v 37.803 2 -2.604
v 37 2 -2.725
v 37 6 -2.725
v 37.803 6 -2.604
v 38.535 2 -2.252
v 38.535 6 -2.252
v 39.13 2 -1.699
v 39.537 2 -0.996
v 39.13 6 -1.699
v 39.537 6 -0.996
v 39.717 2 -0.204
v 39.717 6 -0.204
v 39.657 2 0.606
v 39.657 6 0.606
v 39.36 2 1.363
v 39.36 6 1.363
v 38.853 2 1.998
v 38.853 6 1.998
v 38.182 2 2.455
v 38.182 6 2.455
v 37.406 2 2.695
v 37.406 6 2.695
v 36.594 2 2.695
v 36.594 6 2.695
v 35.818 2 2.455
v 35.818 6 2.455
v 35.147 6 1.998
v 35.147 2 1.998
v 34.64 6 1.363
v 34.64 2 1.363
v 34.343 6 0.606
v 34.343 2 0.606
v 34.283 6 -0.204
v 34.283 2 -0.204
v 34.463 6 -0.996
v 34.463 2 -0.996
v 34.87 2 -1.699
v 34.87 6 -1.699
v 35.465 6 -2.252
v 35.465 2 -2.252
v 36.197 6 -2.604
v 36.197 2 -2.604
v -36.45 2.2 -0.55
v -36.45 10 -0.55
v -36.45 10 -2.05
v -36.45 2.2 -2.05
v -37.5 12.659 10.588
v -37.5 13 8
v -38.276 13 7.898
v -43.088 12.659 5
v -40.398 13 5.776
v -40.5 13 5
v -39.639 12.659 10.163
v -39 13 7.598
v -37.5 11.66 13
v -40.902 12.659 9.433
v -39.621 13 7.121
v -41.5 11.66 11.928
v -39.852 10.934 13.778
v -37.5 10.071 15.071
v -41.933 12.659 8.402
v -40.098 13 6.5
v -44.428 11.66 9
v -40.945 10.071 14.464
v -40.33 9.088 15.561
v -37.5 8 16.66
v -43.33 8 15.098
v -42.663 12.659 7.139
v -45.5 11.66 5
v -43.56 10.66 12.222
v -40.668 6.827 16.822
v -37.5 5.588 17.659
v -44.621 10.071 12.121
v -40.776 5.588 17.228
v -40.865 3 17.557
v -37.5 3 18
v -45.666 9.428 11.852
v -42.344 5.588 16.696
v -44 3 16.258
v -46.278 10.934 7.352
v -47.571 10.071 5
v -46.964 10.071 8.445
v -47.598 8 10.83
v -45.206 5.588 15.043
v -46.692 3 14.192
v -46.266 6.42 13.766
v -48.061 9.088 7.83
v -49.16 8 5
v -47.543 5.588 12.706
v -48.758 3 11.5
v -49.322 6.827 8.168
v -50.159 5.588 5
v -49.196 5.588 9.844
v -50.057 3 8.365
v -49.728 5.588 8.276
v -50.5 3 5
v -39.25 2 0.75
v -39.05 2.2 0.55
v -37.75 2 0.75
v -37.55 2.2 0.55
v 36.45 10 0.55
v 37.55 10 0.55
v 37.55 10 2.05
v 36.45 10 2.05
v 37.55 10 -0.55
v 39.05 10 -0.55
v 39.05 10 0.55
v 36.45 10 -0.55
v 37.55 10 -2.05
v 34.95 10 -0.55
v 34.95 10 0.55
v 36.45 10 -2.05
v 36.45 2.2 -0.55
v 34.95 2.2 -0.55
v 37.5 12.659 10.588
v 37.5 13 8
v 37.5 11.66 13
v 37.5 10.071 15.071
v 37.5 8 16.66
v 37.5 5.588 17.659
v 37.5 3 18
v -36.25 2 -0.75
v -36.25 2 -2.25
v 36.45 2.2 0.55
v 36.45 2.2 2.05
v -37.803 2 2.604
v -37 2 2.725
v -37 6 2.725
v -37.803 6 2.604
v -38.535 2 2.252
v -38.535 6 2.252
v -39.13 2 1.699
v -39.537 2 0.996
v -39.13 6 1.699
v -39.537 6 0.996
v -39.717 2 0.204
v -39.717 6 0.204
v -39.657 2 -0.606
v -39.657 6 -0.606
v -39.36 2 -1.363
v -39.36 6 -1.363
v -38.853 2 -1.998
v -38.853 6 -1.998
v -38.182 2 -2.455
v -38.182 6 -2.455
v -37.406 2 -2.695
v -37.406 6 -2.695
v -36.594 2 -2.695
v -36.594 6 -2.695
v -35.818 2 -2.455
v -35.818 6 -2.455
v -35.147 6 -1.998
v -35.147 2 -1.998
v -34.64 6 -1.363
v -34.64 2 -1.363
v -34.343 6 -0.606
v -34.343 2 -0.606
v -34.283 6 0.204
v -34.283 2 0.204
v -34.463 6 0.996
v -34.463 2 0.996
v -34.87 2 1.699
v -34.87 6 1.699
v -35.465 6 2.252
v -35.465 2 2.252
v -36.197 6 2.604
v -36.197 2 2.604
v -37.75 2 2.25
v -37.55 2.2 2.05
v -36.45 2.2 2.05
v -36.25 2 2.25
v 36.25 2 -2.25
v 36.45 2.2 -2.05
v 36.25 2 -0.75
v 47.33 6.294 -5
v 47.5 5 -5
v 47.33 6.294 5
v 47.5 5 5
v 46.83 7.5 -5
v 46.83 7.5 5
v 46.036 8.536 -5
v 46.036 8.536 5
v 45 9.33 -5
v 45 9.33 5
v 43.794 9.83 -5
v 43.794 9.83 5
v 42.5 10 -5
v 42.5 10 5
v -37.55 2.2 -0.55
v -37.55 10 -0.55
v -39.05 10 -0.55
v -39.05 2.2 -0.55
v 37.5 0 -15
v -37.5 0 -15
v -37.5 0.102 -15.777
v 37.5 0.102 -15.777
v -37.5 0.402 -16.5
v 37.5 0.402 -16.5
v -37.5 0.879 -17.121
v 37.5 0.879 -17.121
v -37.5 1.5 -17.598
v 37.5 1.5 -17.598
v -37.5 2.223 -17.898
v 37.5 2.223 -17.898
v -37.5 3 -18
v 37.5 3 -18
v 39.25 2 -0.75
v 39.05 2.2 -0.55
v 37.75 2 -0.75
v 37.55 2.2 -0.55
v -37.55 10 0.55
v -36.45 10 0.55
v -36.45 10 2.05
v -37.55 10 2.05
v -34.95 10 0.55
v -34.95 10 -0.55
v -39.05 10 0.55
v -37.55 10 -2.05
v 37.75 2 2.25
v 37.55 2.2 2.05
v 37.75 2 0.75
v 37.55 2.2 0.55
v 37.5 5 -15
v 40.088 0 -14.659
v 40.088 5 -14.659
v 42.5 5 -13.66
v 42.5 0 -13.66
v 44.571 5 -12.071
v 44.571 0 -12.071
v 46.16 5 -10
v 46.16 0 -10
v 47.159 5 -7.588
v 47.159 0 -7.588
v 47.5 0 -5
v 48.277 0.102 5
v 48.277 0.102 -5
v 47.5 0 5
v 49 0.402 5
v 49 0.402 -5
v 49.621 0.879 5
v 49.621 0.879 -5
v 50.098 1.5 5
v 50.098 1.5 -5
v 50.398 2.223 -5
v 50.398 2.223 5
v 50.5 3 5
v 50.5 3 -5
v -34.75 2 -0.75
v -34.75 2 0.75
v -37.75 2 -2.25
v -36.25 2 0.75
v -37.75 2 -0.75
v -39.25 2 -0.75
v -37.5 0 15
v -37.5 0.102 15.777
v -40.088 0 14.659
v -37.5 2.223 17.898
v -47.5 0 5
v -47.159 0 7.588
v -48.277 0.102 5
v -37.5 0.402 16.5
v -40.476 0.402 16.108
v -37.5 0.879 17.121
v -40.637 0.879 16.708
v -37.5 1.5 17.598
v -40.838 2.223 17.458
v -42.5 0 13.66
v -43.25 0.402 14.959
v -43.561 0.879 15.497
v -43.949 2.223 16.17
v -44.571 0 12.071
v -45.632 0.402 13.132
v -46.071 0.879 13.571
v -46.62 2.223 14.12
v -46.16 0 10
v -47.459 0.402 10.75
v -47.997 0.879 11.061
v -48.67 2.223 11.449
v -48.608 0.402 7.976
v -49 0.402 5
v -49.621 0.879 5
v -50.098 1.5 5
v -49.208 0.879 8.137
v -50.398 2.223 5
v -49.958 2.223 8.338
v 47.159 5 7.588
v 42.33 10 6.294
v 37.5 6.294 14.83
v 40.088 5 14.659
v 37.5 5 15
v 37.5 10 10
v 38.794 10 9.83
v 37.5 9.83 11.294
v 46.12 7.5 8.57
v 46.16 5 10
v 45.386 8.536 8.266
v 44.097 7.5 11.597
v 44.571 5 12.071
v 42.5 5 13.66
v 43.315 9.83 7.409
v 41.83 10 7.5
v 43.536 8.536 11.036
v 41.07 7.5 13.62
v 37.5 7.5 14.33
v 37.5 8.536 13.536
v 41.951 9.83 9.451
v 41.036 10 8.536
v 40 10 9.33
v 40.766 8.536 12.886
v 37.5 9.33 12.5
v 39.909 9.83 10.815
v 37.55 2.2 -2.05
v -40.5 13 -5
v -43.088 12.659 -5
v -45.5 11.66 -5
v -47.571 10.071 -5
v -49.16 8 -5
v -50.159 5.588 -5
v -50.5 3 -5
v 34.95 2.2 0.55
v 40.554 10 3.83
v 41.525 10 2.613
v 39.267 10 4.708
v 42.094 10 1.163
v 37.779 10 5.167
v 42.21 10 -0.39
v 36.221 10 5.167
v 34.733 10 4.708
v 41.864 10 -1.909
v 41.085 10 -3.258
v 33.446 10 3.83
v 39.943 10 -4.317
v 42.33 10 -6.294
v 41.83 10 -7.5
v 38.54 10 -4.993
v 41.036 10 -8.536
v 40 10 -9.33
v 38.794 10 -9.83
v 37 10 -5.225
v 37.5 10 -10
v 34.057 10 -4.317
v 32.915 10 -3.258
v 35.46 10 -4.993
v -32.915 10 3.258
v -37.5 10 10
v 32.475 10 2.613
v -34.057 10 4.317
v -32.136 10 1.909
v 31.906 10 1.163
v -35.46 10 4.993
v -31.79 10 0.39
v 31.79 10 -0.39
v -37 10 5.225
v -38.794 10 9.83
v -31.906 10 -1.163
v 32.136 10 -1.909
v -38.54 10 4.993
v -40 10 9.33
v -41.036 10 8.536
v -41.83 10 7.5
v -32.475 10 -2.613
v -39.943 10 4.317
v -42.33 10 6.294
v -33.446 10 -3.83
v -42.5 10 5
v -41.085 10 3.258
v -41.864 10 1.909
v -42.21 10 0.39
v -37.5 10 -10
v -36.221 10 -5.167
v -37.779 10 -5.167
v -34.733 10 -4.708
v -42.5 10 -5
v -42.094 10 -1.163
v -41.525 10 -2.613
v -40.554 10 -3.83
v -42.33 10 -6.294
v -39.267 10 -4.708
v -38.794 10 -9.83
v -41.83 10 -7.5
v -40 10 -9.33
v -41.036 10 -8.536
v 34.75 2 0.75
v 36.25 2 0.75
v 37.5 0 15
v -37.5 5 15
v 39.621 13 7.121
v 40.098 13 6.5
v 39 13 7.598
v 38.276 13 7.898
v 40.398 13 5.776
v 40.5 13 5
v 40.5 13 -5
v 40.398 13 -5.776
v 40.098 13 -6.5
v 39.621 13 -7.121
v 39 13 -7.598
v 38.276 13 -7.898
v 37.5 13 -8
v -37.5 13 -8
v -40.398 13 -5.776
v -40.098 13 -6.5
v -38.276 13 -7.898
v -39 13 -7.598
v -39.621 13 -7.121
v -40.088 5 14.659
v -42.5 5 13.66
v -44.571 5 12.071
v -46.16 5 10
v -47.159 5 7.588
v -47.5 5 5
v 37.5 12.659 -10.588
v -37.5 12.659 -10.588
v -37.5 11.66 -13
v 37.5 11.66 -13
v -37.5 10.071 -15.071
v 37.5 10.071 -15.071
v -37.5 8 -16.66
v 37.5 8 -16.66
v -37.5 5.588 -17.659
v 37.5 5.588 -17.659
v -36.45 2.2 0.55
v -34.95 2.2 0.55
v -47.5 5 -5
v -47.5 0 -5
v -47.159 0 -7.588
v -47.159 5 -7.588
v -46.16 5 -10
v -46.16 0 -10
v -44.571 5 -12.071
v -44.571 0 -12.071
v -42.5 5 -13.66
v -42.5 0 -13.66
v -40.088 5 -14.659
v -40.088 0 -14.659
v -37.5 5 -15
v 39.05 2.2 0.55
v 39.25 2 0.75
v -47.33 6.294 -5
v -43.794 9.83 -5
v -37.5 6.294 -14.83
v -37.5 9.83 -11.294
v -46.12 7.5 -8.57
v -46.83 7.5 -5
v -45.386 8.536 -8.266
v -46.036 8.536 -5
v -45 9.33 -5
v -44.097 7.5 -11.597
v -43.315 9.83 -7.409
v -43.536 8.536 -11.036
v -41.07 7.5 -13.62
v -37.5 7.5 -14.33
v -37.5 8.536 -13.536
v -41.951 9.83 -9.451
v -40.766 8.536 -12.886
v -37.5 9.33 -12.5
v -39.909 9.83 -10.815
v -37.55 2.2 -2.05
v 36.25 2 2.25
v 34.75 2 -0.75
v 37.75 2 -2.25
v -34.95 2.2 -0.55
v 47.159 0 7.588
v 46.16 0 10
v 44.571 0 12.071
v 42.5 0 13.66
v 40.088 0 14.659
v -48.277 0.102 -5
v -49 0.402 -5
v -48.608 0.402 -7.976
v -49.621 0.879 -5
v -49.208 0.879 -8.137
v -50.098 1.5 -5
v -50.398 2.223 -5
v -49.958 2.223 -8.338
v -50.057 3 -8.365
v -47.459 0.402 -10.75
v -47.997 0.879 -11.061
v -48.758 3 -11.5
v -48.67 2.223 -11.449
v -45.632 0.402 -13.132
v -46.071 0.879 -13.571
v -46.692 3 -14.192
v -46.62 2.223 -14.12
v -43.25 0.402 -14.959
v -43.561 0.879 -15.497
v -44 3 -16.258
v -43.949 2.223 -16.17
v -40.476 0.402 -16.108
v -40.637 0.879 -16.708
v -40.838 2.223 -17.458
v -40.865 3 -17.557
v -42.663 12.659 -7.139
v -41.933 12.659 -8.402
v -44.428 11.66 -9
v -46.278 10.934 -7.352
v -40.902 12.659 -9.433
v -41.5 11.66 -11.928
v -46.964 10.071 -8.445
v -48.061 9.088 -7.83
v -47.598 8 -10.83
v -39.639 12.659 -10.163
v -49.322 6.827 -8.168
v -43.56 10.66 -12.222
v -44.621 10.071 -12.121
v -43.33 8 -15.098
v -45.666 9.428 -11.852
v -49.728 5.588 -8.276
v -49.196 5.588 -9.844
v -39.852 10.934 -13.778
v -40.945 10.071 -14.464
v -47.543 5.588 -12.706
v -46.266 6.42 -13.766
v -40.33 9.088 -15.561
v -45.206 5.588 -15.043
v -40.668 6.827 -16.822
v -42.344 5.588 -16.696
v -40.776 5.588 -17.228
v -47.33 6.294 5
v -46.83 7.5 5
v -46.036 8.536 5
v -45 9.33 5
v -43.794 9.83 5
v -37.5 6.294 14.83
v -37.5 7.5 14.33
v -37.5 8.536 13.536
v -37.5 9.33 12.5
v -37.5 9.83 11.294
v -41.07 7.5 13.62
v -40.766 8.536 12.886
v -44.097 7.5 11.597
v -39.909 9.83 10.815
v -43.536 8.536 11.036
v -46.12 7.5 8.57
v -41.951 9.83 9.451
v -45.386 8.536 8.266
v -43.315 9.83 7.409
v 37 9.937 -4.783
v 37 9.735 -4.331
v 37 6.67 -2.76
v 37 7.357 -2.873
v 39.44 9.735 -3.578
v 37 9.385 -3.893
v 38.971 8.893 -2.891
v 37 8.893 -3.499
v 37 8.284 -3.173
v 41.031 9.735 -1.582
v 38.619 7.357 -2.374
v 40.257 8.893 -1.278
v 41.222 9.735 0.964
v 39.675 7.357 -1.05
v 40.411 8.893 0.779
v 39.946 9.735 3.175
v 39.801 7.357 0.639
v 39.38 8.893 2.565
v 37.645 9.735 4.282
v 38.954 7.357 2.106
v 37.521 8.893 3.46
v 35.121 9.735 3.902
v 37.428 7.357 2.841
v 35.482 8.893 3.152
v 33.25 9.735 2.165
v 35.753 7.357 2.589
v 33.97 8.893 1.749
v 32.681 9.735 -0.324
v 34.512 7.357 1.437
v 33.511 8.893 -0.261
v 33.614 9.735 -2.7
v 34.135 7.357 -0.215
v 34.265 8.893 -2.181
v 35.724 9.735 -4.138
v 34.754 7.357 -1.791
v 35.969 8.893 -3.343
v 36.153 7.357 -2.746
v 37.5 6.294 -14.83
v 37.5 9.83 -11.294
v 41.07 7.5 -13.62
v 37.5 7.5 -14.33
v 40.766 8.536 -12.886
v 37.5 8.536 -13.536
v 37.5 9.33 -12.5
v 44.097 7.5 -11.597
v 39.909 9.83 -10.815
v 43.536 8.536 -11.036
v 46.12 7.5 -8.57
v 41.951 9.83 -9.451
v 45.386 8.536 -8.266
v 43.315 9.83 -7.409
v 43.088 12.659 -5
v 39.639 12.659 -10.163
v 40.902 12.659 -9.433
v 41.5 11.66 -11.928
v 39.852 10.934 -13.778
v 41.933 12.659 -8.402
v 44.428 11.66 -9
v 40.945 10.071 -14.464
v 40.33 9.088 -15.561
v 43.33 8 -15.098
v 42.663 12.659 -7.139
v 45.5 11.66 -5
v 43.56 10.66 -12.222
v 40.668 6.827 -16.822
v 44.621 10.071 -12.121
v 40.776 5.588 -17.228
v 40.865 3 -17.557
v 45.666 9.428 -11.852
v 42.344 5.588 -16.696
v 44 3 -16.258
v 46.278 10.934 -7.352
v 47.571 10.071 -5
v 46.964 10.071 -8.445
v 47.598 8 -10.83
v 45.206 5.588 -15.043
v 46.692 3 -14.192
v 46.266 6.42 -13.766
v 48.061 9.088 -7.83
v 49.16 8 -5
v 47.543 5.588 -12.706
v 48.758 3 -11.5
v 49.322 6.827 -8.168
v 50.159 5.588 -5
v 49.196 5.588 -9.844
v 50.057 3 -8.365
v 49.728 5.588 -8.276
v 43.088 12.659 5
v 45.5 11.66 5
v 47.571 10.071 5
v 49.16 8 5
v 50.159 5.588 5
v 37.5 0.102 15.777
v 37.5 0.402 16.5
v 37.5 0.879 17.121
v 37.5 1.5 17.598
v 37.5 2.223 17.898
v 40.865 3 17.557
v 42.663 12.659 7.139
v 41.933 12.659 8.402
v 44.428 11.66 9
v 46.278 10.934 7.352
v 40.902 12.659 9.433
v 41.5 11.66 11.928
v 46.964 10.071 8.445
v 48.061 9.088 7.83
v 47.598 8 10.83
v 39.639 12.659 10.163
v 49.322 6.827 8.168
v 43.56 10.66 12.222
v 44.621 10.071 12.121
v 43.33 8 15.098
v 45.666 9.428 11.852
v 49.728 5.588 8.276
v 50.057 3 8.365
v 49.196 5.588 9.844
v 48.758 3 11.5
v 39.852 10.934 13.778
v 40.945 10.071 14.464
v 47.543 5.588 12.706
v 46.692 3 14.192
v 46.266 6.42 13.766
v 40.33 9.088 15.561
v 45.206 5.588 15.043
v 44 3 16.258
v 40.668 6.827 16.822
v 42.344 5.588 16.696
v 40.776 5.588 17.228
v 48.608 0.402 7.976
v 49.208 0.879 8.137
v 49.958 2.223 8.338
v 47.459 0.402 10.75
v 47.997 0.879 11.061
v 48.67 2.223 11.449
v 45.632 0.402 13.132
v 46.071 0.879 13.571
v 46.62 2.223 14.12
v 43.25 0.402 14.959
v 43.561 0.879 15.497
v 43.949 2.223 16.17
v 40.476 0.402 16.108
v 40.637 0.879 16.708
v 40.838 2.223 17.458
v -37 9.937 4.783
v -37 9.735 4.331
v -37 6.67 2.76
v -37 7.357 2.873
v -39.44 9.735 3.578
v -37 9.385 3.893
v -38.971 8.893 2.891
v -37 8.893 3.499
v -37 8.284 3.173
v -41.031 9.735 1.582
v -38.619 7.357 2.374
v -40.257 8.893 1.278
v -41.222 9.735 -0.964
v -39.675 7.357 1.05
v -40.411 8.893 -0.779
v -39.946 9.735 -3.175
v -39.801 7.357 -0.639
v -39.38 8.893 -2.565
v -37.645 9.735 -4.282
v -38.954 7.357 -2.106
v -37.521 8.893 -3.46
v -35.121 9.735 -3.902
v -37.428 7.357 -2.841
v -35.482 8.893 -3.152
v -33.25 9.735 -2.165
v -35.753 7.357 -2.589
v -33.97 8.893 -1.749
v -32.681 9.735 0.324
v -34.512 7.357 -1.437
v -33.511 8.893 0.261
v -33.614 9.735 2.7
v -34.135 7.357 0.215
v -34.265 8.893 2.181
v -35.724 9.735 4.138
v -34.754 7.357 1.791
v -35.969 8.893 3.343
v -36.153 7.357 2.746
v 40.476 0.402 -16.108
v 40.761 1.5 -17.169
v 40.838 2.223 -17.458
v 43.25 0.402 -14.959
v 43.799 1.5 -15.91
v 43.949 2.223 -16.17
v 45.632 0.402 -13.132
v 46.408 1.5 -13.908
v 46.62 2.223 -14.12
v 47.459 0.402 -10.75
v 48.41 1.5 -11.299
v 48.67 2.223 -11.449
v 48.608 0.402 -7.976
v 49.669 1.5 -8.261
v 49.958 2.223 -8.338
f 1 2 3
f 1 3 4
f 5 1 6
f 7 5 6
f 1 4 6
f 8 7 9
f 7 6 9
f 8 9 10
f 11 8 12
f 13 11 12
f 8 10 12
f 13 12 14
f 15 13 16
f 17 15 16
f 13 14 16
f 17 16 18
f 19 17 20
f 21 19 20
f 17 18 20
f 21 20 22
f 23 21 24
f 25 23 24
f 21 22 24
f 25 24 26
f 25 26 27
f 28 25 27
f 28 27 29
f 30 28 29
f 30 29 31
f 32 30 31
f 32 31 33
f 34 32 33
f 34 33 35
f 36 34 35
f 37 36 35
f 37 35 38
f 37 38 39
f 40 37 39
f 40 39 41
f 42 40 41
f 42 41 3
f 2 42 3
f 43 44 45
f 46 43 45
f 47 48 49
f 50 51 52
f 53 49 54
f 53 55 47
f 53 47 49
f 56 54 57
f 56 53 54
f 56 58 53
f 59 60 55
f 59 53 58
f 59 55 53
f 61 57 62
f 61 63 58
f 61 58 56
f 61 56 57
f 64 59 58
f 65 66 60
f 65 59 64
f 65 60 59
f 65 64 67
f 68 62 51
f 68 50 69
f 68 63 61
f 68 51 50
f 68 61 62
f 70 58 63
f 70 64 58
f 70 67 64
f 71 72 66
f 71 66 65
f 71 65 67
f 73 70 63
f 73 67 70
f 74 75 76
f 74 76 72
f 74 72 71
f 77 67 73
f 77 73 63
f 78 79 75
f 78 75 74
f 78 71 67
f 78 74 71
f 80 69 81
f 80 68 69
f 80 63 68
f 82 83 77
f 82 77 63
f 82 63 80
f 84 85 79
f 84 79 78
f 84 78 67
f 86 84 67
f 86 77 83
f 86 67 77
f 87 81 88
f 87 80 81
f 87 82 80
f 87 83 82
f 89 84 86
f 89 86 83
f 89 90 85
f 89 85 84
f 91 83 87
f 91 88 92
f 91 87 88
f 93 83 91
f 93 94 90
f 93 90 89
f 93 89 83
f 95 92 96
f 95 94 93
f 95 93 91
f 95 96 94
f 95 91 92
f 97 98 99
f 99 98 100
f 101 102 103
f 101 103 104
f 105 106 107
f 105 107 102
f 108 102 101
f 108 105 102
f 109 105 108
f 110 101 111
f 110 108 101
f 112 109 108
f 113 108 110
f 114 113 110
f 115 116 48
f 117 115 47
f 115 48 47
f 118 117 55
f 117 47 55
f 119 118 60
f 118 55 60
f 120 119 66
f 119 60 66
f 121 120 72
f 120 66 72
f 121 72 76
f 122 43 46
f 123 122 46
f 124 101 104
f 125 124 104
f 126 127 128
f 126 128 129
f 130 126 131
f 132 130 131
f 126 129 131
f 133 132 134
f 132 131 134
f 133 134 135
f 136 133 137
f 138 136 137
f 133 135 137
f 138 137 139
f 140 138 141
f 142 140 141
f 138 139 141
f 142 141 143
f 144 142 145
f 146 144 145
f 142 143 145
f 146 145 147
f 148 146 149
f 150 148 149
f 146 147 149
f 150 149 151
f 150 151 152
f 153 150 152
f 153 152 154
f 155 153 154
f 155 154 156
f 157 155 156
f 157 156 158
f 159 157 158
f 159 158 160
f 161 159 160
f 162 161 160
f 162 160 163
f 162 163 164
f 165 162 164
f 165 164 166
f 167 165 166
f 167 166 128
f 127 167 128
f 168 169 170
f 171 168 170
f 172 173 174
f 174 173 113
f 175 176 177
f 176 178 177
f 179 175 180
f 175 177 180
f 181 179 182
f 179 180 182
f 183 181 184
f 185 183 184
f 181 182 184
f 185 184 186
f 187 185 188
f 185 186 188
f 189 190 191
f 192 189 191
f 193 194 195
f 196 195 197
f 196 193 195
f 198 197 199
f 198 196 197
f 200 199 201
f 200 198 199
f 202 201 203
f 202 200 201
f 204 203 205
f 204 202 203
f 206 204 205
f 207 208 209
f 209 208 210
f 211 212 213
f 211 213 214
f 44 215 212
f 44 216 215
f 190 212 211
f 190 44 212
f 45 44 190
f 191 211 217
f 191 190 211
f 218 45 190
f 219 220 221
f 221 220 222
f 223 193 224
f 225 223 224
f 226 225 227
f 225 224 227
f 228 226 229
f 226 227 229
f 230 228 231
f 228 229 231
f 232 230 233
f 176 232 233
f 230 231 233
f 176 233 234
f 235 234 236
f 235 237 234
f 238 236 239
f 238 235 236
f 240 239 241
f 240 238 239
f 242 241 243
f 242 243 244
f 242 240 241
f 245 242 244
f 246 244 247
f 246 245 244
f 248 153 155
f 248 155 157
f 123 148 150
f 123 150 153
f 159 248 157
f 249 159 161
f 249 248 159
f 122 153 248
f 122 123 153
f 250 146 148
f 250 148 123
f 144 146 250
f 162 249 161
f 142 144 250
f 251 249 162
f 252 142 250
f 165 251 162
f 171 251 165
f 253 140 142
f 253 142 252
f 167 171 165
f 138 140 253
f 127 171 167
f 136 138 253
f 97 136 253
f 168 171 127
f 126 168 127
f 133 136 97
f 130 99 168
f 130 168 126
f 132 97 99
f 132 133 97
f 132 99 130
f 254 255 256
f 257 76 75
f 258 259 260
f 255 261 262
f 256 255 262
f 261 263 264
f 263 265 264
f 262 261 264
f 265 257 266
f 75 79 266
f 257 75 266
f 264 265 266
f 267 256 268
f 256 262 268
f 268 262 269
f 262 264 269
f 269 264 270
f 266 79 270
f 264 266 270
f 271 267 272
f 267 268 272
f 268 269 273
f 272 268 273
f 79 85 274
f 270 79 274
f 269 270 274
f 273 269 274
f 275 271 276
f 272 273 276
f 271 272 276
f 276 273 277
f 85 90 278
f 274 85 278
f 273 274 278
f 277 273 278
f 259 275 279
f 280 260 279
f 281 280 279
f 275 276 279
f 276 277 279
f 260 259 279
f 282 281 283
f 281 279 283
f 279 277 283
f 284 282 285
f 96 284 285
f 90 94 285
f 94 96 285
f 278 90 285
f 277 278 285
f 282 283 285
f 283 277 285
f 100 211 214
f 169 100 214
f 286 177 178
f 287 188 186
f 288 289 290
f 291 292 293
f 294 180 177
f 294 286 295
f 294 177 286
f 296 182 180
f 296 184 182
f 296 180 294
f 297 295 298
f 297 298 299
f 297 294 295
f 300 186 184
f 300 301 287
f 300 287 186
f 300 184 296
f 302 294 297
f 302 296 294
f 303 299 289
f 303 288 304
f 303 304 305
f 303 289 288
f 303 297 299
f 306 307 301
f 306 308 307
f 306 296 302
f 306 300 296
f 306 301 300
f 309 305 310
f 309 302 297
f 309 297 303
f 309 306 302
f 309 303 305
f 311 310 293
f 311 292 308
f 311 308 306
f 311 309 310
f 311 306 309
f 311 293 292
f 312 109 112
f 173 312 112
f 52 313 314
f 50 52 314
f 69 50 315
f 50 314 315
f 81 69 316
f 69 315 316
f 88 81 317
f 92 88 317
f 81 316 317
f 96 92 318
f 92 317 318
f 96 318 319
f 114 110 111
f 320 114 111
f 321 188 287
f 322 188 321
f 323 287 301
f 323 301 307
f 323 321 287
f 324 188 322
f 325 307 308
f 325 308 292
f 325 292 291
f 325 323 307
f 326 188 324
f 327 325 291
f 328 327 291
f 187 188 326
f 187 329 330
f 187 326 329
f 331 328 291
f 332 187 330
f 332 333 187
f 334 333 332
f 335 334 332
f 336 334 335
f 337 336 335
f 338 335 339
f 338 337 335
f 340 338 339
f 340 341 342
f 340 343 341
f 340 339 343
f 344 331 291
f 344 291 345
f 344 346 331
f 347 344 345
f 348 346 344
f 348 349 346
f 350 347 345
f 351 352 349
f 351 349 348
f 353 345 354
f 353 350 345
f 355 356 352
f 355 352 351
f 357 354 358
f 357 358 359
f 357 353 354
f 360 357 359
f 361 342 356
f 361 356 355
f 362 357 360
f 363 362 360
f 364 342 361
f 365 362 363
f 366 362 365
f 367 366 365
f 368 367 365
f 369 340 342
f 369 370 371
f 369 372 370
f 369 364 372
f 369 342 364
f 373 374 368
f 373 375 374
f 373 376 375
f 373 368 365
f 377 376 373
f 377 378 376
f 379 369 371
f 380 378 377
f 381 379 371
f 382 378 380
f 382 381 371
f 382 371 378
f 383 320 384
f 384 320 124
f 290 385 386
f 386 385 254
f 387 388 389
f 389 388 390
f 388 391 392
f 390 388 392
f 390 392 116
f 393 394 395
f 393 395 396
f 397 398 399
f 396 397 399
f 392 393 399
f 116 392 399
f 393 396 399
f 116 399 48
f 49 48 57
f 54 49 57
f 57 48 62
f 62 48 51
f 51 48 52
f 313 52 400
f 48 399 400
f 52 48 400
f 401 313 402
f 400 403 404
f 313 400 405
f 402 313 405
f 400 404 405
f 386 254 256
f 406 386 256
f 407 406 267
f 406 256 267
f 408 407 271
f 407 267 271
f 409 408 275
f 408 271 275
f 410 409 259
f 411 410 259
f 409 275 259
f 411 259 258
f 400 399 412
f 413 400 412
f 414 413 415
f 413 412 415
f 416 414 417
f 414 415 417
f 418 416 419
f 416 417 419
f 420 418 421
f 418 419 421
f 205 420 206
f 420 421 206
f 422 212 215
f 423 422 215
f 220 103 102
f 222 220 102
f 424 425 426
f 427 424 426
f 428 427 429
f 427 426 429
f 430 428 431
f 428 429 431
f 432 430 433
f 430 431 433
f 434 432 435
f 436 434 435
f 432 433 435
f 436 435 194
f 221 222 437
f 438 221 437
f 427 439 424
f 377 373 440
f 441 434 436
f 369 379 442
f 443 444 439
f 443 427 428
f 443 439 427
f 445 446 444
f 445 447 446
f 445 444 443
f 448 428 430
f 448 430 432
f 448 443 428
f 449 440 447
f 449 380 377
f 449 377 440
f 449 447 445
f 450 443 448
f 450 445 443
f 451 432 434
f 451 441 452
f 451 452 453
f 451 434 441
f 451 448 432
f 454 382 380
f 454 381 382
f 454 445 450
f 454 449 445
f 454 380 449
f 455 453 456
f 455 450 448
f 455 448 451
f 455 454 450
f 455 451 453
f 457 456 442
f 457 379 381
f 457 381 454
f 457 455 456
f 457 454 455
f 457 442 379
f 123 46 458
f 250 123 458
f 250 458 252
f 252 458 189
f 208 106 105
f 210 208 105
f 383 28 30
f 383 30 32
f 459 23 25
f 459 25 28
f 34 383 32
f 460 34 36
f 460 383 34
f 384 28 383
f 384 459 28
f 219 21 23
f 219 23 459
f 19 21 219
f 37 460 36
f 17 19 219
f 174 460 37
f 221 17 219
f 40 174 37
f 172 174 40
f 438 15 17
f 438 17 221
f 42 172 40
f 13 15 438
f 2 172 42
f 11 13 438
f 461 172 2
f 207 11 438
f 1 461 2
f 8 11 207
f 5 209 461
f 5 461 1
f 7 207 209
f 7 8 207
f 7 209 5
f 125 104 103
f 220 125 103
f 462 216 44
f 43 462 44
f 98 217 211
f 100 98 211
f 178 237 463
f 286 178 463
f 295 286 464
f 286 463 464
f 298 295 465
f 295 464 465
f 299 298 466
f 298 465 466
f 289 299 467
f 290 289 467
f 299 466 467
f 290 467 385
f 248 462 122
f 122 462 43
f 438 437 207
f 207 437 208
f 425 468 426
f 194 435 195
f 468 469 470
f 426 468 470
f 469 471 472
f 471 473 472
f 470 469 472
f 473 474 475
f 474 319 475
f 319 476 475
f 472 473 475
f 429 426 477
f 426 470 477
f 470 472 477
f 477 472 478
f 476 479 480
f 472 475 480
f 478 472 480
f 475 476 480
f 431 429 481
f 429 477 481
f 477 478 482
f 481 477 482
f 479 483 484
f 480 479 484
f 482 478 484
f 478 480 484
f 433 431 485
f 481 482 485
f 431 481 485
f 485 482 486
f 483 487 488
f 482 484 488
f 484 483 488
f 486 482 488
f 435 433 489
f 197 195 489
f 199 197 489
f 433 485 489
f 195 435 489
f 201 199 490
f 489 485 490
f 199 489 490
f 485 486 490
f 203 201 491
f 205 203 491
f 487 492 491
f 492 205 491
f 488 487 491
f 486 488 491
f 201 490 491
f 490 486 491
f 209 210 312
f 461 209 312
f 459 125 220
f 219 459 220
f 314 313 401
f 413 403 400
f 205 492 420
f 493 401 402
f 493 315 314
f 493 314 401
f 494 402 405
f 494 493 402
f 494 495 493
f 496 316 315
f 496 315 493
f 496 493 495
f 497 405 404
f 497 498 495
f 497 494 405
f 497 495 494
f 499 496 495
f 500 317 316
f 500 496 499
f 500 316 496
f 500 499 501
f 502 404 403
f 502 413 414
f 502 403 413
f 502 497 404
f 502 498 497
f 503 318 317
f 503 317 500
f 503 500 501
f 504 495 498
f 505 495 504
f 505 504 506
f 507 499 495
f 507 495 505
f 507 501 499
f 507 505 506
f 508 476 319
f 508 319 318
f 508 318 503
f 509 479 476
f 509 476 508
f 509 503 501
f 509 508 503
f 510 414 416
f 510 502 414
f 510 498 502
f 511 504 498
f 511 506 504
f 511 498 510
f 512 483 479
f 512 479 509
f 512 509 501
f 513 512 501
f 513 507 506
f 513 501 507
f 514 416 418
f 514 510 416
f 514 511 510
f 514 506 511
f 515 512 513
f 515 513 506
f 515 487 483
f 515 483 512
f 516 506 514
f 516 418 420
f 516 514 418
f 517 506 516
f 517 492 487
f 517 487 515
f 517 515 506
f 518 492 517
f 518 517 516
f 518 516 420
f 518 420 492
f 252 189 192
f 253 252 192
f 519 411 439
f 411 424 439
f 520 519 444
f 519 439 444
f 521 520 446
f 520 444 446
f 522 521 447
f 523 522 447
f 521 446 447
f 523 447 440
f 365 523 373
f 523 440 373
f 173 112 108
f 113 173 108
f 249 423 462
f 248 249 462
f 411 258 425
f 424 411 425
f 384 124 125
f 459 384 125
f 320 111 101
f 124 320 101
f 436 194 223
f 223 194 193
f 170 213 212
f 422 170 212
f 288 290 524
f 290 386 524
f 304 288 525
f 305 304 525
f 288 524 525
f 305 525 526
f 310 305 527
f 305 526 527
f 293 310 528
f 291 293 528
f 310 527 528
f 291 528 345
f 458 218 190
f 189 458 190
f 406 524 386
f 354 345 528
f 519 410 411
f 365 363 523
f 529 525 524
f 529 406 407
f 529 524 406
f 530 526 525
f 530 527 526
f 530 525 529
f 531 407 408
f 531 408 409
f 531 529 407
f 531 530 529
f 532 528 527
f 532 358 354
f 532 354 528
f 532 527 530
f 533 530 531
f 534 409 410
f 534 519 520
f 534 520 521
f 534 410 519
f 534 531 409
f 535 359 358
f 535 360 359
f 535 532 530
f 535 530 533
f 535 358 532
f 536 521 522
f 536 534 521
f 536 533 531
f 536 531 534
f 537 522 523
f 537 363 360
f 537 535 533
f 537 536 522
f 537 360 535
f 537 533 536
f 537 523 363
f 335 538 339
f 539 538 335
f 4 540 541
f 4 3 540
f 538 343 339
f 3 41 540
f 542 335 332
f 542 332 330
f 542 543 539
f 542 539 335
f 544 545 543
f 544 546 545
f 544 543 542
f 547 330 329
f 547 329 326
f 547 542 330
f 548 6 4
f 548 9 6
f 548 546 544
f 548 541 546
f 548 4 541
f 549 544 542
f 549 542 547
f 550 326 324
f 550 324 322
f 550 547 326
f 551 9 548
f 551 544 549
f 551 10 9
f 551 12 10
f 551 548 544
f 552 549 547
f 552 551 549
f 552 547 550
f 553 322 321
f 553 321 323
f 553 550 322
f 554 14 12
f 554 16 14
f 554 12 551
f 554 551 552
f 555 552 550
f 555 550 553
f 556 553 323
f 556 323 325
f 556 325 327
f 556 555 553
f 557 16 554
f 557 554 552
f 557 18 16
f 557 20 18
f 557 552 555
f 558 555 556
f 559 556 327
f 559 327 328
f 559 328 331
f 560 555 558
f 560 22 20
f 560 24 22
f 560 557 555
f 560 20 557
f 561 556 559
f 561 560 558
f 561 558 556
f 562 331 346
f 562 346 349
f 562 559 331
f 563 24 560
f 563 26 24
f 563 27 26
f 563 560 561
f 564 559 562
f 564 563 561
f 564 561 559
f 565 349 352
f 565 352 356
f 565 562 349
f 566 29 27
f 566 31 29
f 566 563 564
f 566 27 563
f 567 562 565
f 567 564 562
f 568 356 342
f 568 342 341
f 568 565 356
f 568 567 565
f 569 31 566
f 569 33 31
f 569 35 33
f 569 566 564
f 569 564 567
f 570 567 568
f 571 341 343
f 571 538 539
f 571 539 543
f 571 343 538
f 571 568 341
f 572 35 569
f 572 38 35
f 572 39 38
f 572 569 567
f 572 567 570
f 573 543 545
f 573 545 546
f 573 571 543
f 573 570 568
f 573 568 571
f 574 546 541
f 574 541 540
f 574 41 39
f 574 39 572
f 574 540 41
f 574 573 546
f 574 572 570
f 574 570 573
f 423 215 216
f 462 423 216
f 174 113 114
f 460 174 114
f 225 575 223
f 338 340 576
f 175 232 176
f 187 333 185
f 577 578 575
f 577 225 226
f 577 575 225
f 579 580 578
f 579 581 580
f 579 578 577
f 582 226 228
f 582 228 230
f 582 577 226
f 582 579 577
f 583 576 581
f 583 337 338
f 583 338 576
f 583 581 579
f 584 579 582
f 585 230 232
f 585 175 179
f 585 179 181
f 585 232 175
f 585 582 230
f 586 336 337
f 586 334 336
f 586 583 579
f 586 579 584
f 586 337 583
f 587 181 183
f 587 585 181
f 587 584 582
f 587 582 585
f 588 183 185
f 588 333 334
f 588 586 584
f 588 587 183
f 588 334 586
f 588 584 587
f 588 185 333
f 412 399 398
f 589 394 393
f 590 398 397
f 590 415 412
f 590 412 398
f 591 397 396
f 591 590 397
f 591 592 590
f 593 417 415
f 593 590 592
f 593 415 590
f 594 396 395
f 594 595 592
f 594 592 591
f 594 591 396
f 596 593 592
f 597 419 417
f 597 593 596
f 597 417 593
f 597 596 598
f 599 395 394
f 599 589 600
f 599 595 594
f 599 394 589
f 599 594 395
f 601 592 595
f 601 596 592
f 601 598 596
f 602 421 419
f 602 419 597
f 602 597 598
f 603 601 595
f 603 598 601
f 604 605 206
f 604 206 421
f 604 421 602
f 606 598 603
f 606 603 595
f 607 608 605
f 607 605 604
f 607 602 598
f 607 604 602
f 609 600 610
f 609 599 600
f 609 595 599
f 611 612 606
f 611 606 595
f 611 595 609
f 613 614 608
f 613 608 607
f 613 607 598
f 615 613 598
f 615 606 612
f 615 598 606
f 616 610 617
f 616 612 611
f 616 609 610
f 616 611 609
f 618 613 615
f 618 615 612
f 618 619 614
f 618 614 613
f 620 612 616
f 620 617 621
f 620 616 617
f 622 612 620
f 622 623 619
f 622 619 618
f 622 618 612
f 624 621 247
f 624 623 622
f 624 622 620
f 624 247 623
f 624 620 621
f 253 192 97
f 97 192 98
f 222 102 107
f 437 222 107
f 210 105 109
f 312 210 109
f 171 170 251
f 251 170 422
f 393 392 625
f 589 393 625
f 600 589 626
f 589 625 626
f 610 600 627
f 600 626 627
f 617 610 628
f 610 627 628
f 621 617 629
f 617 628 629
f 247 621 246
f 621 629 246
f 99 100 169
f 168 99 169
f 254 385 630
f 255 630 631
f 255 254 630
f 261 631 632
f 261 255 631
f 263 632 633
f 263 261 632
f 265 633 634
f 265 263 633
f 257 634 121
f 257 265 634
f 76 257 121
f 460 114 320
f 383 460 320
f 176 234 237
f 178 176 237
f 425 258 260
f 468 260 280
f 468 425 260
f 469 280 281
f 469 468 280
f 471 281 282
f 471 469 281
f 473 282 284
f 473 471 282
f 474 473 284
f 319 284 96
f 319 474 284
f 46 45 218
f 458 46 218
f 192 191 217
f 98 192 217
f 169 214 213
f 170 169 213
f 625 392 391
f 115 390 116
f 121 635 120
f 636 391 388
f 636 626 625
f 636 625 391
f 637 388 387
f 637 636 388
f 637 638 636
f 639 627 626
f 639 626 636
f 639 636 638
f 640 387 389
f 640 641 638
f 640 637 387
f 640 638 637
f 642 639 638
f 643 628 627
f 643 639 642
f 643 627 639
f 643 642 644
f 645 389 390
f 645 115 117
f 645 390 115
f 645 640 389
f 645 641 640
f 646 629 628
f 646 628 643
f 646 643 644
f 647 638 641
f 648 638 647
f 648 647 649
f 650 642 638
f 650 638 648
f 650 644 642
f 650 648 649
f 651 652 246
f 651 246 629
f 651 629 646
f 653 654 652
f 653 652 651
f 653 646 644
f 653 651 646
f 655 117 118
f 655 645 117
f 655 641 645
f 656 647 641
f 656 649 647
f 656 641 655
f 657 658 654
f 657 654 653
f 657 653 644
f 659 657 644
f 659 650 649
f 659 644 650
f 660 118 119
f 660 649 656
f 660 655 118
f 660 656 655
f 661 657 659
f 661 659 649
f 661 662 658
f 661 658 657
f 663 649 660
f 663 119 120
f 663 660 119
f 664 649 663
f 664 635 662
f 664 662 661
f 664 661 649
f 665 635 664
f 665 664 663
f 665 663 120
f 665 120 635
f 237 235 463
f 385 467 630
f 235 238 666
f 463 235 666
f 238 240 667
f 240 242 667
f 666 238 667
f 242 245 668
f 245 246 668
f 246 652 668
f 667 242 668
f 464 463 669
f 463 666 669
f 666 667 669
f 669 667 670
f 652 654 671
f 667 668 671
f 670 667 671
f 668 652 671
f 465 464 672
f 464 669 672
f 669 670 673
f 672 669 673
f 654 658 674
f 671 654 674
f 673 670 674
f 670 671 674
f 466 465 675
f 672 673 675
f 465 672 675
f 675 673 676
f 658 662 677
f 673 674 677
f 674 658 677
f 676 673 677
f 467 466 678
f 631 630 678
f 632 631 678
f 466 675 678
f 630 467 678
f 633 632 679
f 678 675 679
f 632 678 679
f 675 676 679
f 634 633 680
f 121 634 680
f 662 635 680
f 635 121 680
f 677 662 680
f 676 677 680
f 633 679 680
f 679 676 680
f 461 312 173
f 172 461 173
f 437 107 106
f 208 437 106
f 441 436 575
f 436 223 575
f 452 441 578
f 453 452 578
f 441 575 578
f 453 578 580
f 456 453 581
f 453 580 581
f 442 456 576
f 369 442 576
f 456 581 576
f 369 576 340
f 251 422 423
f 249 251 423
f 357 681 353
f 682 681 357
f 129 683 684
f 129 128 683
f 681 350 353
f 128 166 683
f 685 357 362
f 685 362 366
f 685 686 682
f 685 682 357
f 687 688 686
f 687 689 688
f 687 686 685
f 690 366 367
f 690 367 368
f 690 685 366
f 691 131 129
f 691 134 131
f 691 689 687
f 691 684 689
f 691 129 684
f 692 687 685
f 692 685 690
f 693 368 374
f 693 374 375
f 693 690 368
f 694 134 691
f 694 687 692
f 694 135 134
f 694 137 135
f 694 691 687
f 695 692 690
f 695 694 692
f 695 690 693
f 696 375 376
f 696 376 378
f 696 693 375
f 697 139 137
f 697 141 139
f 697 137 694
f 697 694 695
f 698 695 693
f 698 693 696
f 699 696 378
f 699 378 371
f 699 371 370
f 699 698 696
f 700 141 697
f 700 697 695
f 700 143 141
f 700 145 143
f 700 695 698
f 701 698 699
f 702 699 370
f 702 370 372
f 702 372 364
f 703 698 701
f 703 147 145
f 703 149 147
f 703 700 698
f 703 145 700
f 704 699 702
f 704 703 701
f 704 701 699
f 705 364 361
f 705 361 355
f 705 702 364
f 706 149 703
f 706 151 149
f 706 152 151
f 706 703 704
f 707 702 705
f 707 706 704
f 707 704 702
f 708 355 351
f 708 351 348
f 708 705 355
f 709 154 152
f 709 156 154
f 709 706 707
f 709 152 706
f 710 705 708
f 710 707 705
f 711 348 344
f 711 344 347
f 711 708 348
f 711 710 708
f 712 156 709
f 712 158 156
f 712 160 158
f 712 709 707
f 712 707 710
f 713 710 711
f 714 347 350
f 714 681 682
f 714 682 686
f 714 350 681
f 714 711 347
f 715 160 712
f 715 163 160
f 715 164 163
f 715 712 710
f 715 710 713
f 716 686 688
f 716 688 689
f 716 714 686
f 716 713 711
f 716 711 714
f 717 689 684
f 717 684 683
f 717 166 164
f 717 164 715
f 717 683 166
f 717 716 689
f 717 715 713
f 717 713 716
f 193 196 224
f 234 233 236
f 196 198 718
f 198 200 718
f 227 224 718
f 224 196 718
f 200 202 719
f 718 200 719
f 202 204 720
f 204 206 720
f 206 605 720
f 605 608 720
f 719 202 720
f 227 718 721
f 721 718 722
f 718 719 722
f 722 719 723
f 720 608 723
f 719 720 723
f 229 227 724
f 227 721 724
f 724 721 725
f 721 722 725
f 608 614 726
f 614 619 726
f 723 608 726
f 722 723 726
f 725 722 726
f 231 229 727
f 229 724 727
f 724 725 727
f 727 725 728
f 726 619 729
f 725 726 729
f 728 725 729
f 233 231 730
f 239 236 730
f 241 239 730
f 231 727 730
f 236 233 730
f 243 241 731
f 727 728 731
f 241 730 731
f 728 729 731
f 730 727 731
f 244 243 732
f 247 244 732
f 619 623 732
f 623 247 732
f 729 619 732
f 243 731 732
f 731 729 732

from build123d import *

# Parameters (mm, degrees)
EXTRUDE_1_DEPTH  = 10
SHELL_2_T        = 3
FILLET_3_R       = 10
FILLET_4_R       = 3
SKETCH_2_R       = 2.725
EXTRUDE_2_DEPTH  = 8
FILLET_7_R       = 5
CHAMFER_1_SIZE   = 0.2
CHAMFER_2_SIZE   = 0.2
FILLET_9_SIZE    = 2.5
FILLET_9_SIZE_2  = 4
FILLET_10_SIZE   = 2.5
FILLET_10_SIZE_2 = 4


# Some blends are built 0.0001 mm under size
with BuildPart() as part:
    # 草图1 → 凸台-拉伸1 (new body)
    with BuildSketch(Plane(origin=(0, 0, 0), x_dir=(1, 0, 0), z_dir=(0, 1, 0))):
        with BuildLine():
            Line((-37.5, 15), (37.5, 15))
            ThreePointArc((37.5, 15), (44.571067812, 12.071067812), (47.5, 5))
            Line((47.5, 5), (47.5, -5))
            ThreePointArc((47.5, -5), (44.571067812, -12.071067812), (37.5, -15))
            Line((37.5, -15), (-37.5, -15))
            ThreePointArc((-37.5, -15), (-44.571067812, -12.071067812), (-47.5, -5))
            Line((-47.5, -5), (-47.5, 5))
            ThreePointArc((-47.5, 5), (-44.571067812, 12.071067812), (-37.5, 15))
        make_face()
    extrude(amount=EXTRUDE_1_DEPTH)

    # 抽壳2
    shell_2_openings = [part.faces().sort_by_distance(p)[0] for p in [
        (0, 0, 0),
    ]]
    offset(amount=SHELL_2_T, openings=shell_2_openings, kind=Kind.INTERSECTION)

    # 圆角3
    # the kernel refuses this fillet: 10 mm, written as the material it takes off along each edge
    with BuildSketch(Plane(origin=(37.5, 13, 5), x_dir=(1, 0, 0), z_dir=(0, 0, -1))) as fillet_3_piece_1:
        with BuildLine():
            CenterArc((13 - FILLET_3_R, FILLET_3_R), FILLET_3_R, 270, 90)
            Line((13 - FILLET_3_R, 0), (13, 0))
            Line((13, 0), (13, FILLET_3_R))
        make_face()
    revolve(axis=Axis((37.5, 13, 5), (0, -1, 0)), revolution_arc=90, mode=Mode.SUBTRACT)
    with BuildSketch(Plane(origin=(50.5, 13, 5), x_dir=(0, -1, 0), z_dir=(0, 0, -1)), Plane(origin=(-50.5, 13, -5), x_dir=(0, -1, 0), z_dir=(0, 0, 1))) as fillet_3_piece_2:
        with BuildLine():
            CenterArc((FILLET_3_R, FILLET_3_R), FILLET_3_R, 180, 90)
            Line((0, FILLET_3_R), (0, 0))
            Line((0, 0), (FILLET_3_R, 0))
        make_face()
    extrude(amount=10, mode=Mode.SUBTRACT)
    with BuildSketch(Plane(origin=(37.5, 13, -5), x_dir=(0, 0, -1), z_dir=(-1, 0, 0))) as fillet_3_piece_3:
        with BuildLine():
            CenterArc((13 - FILLET_3_R, FILLET_3_R), FILLET_3_R, 270, 90)
            Line((13 - FILLET_3_R, 0), (13, 0))
            Line((13, 0), (13, FILLET_3_R))
        make_face()
    revolve(axis=Axis((37.5, 13, -5), (0, -1, 0)), revolution_arc=90, mode=Mode.SUBTRACT)
    with BuildSketch(Plane(origin=(37.5, 13, -18), x_dir=(0, -1, 0), z_dir=(-1, 0, 0)), Plane(origin=(-37.5, 13, 18), x_dir=(0, -1, 0), z_dir=(1, 0, 0))) as fillet_3_piece_4:
        with BuildLine():
            CenterArc((FILLET_3_R, FILLET_3_R), FILLET_3_R, 180, 90)
            Line((0, FILLET_3_R), (0, 0))
            Line((0, 0), (FILLET_3_R, 0))
        make_face()
    extrude(amount=75, mode=Mode.SUBTRACT)
    with BuildSketch(Plane(origin=(-37.5, 13, -5), x_dir=(-1, 0, 0), z_dir=(0, 0, 1))) as fillet_3_piece_5:
        with BuildLine():
            CenterArc((13 - FILLET_3_R, FILLET_3_R), FILLET_3_R, 270, 90)
            Line((13 - FILLET_3_R, 0), (13, 0))
            Line((13, 0), (13, FILLET_3_R))
        make_face()
    revolve(axis=Axis((-37.5, 13, -5), (0, -1, 0)), revolution_arc=90, mode=Mode.SUBTRACT)
    with BuildSketch(Plane(origin=(-37.5, 13, 5), x_dir=(0, 0, 1), z_dir=(1, 0, 0))) as fillet_3_piece_6:
        with BuildLine():
            CenterArc((13 - FILLET_3_R, FILLET_3_R), FILLET_3_R, 270, 90)
            Line((13 - FILLET_3_R, 0), (13, 0))
            Line((13, 0), (13, FILLET_3_R))
        make_face()
    revolve(axis=Axis((-37.5, 13, 5), (0, -1, 0)), revolution_arc=90, mode=Mode.SUBTRACT)

    # 圆角4
    fillet_4_edges = [part.edges().sort_by_distance(p)[0] for p in [
        (50.5, 0, 0),
        (46.692388155, 0, 14.192388155),
        (0, 0, 18),
        (-46.692388155, 0, 14.192388155),
        (-50.5, 0, 0),
        (-46.692388155, 0, -14.192388155),
        (0, 0, -18),
        (46.692388155, 0, -14.192388155),
    ]]
    fillet(fillet_4_edges, radius=FILLET_4_R - 0.0001)  # a hair under: the kernel refuses the full size

    # 草图2 → 凸台-拉伸2 (add)
    # profile 1 of 2: a face of its own
    with BuildSketch(Plane(origin=(0, 10, 0), x_dir=(-1, 0, 0), z_dir=(0, -1, 0))):
        with Locations(Location((37, 0, 0), (0, 0, 270))):
            Circle(SKETCH_2_R)
        Polygon((34.95, -0.55), (34.95, 0.55), (36.45, 0.55), (36.45, 2.05), (37.55, 2.05), (37.55, 0.55), (39.05, 0.55), (39.05, -0.55), (37.55, -0.55), (37.55, -2.05), (36.45, -2.05), (36.45, -0.55), align=None, mode=Mode.SUBTRACT)
    # profile 2 of 2: a face of its own
    with BuildSketch(Plane(origin=(0, 10, 0), x_dir=(-1, 0, 0), z_dir=(0, -1, 0))):
        with Locations(Location((-37, 0, 0), (0, 0, 90))):
            Circle(SKETCH_2_R)
        Polygon((-37.55, 0.55), (-37.55, 2.05), (-36.45, 2.05), (-36.45, 0.55), (-34.95, 0.55), (-34.95, -0.55), (-36.45, -0.55), (-36.45, -2.05), (-37.55, -2.05), (-37.55, -0.55), (-39.05, -0.55), (-39.05, 0.55), align=None, mode=Mode.SUBTRACT)
    extrude(amount=EXTRUDE_2_DEPTH)

    # 圆角7
    fillet_7_edges = [part.edges().sort_by_distance(p)[0] for p in [
        (-44.571067812, 10, 12.071067812),
        (0, 10, 15),
        (44.571067812, 10, 12.071067812),
        (47.5, 10, 0),
        (44.571067812, 10, -12.071067812),
        (0, 10, -15),
        (-44.571067812, 10, -12.071067812),
        (-47.5, 10, 0),
    ]]
    fillet(fillet_7_edges, radius=FILLET_7_R)

    # 倒角1
    chamfer_1_edges = [part.edges().sort_by_distance(p)[0] for p in [
        (35.7, 2, -0.55),
        (37.55, 2, 1.3),
        (39.05, 2, 0),
        (38.3, 2, -0.55),
        (37.55, 2, -1.3),
        (37, 2, -2.05),
        (34.95, 2, 0),
        (35.7, 2, 0.55),
        (36.45, 2, 1.3),
        (37, 2, 2.05),
        (38.3, 2, 0.55),
        (36.45, 2, -1.3),
    ]]
    chamfer(chamfer_1_edges, length=CHAMFER_1_SIZE)

    # 倒角2
    chamfer_2_edges = [part.edges().sort_by_distance(p)[0] for p in [
        (-37, 2, -2.05),
        (-37.55, 2, -1.3),
        (-38.3, 2, -0.55),
        (-39.05, 2, 0),
        (-37.55, 2, 1.3),
        (-35.7, 2, -0.55),
        (-38.3, 2, 0.55),
        (-37, 2, 2.05),
        (-36.45, 2, 1.3),
        (-35.7, 2, 0.55),
        (-34.95, 2, 0),
        (-36.45, 2, -1.3),
    ]]
    chamfer(chamfer_2_edges, length=CHAMFER_2_SIZE)

    # 圆角9
    # an asymmetric fillet: 4, 2.5 mm, written as the material it adds along each edge
    with BuildSketch(Plane(origin=(37, 10, 0), x_dir=(0, 0, -1), z_dir=(-1, 0, 0))) as fillet_9_piece_1:
        with BuildLine():
            Bezier((2.725 + FILLET_9_SIZE, 0), (2.725, 0), (2.725, FILLET_9_SIZE_2), weights=[1, 0.707106781, 1])
            Line((2.725, FILLET_9_SIZE_2), (2.725, 0))
            Line((2.725, 0), (2.725 + FILLET_9_SIZE, 0))
        make_face()
    revolve(axis=Axis((37, 10, 0), (0, -1, 0)))

    # 圆角10
    # an asymmetric fillet: 4, 2.5 mm, written as the material it adds along each edge
    with BuildSketch(Plane(origin=(-37, 10, 0), x_dir=(0, 0, 1), z_dir=(1, 0, 0))) as fillet_10_piece_1:
        with BuildLine():
            Bezier((2.725 + FILLET_10_SIZE, 0), (2.725, 0), (2.725, FILLET_10_SIZE_2), weights=[1, 0.707106781, 1])
            Line((2.725, FILLET_10_SIZE_2), (2.725, 0))
            Line((2.725, 0), (2.725 + FILLET_10_SIZE, 0))
        make_face()
    revolve(axis=Axis((-37, 10, 0), (0, -1, 0)))


solid = part.part
